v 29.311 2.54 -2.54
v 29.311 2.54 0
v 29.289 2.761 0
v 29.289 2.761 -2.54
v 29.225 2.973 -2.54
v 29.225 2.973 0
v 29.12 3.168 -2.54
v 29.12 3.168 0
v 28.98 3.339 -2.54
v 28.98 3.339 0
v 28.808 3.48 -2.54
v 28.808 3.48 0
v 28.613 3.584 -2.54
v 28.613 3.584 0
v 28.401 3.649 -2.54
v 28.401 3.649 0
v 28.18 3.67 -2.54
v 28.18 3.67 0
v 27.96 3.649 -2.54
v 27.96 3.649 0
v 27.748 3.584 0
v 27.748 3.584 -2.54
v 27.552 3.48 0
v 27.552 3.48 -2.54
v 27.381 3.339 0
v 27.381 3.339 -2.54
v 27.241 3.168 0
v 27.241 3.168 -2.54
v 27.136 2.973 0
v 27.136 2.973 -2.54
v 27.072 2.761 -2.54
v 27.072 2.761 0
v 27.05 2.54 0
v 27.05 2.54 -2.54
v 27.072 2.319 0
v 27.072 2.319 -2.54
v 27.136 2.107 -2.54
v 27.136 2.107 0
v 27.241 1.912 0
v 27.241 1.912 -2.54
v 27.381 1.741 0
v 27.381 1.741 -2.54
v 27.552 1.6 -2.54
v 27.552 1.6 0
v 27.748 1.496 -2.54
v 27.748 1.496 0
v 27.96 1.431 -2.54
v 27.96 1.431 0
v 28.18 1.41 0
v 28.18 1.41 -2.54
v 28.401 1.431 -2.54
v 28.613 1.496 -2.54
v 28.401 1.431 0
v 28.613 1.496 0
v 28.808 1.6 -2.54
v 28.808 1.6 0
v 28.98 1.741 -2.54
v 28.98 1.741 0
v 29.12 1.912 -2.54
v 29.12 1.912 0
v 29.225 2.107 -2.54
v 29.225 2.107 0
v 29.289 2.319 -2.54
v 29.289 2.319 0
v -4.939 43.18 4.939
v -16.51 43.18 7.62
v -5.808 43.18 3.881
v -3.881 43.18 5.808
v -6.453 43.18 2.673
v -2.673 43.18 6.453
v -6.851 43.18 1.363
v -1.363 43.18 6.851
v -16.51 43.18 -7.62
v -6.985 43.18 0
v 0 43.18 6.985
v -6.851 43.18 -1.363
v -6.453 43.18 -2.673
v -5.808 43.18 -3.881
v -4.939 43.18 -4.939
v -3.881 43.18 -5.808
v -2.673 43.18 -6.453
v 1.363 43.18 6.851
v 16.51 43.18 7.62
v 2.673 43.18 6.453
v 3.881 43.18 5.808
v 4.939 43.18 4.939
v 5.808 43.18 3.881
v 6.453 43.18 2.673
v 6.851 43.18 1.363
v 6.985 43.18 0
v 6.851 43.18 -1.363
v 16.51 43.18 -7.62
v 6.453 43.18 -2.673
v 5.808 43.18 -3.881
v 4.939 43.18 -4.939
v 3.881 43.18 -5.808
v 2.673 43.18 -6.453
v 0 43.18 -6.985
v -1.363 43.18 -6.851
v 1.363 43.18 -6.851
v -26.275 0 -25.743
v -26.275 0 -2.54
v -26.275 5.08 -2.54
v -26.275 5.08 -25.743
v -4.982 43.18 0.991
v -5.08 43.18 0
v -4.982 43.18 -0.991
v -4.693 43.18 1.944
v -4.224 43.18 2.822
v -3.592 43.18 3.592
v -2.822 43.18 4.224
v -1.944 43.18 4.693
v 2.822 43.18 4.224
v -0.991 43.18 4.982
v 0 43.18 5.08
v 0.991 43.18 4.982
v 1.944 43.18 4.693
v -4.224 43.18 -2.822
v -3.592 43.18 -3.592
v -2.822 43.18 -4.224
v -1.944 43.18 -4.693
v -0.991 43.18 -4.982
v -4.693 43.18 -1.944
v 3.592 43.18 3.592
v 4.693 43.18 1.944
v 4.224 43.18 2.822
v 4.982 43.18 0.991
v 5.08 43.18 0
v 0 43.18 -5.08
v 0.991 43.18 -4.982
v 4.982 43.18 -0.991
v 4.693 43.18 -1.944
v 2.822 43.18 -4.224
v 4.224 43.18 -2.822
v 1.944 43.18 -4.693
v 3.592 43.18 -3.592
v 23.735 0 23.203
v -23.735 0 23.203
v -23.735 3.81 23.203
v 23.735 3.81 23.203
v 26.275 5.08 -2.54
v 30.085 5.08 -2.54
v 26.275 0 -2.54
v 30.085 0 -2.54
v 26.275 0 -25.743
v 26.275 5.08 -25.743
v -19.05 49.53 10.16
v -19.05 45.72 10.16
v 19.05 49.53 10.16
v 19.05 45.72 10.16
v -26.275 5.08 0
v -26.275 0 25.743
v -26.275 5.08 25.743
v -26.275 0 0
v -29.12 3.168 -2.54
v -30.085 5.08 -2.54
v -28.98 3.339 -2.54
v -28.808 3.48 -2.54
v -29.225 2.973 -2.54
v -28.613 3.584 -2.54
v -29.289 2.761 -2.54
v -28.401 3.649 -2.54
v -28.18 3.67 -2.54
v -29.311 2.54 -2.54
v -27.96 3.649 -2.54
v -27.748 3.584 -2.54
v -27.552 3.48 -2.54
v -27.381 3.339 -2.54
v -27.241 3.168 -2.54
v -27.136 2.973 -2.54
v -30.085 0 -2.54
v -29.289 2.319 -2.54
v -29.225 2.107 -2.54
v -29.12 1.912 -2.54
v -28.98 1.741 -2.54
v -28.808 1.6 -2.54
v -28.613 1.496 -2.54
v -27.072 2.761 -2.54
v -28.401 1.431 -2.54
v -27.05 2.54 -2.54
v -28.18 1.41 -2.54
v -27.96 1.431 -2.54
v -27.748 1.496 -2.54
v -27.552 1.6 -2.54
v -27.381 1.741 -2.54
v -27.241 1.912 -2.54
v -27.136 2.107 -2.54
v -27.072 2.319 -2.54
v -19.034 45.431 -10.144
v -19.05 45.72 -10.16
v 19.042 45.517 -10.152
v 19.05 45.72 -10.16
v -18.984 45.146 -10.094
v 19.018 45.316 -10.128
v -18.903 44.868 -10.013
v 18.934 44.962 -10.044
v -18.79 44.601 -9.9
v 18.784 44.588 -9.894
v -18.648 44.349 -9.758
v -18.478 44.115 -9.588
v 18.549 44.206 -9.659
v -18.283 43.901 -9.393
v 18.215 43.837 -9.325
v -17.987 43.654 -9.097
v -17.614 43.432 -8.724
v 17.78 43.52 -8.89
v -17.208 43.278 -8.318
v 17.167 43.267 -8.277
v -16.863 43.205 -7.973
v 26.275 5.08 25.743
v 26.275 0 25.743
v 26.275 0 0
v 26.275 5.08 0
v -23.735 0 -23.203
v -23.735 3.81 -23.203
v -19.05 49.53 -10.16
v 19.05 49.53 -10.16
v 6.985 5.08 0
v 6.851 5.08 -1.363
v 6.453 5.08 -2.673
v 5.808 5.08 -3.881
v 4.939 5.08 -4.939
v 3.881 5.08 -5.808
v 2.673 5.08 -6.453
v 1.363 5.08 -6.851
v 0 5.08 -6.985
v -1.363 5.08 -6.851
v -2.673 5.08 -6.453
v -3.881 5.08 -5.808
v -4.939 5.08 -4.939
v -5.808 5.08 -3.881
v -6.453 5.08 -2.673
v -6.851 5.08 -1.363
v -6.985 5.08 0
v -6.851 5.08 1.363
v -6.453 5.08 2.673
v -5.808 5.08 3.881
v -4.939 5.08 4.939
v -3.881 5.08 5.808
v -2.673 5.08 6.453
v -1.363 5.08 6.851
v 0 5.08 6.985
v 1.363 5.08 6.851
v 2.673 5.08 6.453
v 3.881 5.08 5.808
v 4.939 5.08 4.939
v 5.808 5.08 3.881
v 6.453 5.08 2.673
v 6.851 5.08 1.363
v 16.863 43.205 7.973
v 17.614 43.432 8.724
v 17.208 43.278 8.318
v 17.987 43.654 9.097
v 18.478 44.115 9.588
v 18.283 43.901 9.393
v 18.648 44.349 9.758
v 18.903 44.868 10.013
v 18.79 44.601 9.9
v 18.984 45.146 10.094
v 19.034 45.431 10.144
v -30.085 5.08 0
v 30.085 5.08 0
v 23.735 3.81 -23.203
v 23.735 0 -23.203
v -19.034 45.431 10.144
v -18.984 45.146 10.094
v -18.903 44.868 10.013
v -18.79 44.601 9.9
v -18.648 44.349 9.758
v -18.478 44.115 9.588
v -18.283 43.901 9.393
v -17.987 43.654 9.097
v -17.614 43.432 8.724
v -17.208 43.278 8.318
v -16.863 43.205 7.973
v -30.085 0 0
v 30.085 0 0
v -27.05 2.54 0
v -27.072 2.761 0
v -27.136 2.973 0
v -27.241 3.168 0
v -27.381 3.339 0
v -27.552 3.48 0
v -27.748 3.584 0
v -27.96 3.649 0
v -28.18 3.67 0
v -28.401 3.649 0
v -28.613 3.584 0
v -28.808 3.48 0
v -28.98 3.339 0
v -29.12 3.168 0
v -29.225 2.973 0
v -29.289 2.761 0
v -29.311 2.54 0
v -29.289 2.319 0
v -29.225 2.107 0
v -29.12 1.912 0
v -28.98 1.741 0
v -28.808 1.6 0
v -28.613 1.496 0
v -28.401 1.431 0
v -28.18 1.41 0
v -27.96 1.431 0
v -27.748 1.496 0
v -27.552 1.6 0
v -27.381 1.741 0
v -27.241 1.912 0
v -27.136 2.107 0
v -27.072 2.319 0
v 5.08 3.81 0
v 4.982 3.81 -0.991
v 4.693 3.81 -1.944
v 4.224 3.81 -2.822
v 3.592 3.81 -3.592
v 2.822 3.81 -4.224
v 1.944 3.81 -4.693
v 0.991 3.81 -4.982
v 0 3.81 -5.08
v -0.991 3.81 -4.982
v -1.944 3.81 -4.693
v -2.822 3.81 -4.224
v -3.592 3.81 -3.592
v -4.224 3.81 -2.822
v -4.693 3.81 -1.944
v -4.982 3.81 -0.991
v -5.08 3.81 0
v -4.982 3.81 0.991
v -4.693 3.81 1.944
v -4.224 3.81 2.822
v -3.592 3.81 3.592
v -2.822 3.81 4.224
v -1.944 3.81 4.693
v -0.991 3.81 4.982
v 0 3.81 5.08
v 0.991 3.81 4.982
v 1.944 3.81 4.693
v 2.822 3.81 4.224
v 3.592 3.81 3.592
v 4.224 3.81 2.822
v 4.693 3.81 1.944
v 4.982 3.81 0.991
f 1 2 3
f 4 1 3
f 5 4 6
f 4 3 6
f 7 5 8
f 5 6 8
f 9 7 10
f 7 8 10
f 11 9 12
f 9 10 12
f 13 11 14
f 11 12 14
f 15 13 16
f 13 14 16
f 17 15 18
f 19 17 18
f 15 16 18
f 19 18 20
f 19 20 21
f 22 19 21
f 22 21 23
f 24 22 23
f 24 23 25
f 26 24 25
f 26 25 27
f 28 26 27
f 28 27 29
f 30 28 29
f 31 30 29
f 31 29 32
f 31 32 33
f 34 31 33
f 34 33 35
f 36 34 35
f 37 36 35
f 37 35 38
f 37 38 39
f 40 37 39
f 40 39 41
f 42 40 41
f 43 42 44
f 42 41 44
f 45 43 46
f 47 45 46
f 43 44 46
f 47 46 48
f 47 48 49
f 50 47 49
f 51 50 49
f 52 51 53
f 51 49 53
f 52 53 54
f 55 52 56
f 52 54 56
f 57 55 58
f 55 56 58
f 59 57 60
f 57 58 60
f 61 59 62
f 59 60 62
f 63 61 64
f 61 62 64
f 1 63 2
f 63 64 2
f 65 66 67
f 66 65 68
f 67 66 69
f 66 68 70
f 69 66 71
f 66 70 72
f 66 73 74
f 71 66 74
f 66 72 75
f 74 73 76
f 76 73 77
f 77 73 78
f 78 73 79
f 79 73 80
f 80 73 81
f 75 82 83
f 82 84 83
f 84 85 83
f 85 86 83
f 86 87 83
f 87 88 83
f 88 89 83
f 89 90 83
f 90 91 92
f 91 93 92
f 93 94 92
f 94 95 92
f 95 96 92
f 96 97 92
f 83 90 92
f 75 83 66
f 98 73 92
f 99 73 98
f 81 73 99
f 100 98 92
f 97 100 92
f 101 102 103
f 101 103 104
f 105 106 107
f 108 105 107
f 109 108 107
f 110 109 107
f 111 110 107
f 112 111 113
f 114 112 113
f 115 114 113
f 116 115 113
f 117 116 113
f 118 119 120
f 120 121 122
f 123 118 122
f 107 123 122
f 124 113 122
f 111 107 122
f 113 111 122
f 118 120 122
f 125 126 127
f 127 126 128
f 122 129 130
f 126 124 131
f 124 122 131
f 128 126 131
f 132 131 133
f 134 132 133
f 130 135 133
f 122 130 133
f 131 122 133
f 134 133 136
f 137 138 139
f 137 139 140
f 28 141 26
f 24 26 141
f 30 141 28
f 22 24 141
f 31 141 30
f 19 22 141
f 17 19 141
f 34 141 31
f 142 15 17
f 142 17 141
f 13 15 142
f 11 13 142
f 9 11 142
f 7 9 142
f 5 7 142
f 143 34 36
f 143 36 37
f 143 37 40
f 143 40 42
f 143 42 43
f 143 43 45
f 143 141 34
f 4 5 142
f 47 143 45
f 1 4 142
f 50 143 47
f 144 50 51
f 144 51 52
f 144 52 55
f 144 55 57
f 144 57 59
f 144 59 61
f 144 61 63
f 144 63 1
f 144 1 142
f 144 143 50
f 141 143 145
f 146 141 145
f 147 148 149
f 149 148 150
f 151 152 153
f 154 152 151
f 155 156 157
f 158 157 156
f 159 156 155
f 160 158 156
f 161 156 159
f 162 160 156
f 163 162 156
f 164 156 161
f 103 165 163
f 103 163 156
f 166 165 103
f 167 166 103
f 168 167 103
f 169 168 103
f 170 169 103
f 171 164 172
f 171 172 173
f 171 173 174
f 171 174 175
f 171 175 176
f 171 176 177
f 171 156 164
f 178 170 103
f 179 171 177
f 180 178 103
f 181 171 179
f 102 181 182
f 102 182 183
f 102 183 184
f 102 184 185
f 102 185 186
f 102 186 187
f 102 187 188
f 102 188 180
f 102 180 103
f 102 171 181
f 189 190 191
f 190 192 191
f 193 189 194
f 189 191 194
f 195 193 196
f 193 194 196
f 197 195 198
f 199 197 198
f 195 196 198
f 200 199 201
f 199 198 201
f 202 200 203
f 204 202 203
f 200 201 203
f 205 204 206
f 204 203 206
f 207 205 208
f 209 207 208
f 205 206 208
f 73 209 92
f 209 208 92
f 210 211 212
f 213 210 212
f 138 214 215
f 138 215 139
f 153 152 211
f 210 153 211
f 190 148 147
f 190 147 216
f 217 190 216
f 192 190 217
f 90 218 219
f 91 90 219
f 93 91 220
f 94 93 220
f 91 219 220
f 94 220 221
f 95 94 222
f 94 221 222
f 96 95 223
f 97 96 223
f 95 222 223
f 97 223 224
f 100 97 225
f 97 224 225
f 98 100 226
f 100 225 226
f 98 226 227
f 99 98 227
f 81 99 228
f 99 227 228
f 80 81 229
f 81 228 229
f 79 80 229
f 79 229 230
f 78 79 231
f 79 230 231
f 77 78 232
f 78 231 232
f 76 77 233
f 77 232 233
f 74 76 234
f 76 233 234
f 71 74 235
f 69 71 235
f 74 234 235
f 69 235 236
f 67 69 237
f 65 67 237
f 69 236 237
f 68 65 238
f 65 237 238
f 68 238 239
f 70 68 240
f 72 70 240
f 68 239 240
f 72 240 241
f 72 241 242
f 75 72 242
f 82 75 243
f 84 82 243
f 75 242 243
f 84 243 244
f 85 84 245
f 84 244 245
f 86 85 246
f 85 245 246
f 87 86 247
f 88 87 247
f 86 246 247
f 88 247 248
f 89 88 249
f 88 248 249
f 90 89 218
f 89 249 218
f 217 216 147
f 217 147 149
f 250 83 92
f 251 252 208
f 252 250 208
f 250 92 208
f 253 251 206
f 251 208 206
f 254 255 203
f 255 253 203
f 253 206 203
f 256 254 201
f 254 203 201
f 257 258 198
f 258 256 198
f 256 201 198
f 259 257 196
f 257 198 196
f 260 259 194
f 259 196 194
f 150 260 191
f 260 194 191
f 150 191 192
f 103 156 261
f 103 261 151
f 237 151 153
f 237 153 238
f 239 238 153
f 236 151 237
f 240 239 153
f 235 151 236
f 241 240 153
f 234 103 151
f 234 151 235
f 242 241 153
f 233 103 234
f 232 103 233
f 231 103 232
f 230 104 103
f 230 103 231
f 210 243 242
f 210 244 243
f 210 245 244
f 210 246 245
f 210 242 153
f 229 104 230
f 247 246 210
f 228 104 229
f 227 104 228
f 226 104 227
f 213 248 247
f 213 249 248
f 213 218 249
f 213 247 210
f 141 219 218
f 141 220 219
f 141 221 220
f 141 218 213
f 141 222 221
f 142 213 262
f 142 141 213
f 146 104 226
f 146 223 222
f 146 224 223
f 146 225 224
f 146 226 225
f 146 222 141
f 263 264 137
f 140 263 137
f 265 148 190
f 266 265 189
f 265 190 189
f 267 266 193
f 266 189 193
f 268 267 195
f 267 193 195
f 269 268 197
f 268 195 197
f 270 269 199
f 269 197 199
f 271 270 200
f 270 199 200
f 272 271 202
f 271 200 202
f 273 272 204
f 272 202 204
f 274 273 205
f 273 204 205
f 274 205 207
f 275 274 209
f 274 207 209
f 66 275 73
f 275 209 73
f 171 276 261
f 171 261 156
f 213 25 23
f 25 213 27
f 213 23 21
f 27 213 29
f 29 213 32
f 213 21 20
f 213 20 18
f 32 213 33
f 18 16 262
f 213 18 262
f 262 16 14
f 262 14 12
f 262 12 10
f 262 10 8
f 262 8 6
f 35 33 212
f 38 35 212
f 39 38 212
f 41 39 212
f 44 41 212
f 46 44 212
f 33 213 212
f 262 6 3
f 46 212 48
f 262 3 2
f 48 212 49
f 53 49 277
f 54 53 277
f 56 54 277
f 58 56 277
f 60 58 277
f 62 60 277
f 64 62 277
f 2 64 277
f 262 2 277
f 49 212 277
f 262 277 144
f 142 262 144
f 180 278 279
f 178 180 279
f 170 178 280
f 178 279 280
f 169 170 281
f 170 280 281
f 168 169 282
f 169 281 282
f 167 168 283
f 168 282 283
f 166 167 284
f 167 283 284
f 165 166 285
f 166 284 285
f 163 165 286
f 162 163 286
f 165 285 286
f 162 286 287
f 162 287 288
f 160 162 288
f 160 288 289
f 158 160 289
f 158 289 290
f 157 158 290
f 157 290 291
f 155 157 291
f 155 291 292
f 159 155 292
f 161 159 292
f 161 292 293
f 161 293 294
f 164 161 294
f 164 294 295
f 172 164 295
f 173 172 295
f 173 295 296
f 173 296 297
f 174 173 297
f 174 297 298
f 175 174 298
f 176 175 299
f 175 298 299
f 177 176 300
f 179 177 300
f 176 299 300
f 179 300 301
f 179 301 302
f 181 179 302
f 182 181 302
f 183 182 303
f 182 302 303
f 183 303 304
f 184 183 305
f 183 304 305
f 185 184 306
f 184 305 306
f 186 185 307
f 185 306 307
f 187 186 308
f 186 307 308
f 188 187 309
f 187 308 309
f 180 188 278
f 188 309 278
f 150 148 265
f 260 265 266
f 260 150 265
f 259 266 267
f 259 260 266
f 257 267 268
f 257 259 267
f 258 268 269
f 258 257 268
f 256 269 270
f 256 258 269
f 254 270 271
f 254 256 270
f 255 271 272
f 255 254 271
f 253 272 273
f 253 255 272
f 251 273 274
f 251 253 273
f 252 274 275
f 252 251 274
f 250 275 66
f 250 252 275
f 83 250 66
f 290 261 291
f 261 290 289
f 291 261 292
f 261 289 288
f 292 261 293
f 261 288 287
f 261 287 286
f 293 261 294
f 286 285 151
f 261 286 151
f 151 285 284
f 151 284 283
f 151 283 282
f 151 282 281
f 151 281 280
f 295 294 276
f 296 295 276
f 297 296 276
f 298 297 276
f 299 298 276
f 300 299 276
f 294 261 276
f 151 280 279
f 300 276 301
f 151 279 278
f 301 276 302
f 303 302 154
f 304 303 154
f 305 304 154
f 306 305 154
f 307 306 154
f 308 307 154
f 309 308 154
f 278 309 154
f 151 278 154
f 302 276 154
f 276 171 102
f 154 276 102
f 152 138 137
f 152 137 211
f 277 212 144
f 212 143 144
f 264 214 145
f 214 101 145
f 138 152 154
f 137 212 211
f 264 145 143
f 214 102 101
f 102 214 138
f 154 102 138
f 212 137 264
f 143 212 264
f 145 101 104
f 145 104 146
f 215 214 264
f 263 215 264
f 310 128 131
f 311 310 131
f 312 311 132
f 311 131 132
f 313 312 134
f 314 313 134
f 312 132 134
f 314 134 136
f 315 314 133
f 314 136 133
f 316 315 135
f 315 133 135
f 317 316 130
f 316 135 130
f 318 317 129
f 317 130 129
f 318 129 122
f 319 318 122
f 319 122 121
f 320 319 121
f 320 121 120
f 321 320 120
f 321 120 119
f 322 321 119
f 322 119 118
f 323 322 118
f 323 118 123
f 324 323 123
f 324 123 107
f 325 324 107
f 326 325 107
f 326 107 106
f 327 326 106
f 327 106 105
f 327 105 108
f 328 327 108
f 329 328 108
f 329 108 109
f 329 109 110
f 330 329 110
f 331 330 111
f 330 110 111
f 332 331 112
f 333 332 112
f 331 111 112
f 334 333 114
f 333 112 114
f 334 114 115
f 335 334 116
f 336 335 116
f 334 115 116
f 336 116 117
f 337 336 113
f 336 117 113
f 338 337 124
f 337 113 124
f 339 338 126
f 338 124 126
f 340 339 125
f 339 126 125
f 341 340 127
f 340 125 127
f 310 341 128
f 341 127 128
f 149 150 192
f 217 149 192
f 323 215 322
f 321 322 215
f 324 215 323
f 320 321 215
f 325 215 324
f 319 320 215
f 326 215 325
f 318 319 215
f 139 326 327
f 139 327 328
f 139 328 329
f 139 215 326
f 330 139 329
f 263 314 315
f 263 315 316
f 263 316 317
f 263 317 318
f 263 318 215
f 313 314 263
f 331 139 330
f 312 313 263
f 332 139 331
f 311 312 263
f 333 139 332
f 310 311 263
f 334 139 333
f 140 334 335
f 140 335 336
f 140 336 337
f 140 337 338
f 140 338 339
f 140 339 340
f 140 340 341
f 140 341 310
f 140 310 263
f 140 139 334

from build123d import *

# Parameters (mm, degrees)
SKETCH2_W           = 52.5507204
SKETCH2_H           = 51.48598542
SKETCH2_W_2         = 3.81
SKETCH2_H_2         = 2.54
BOSS_EXTRUDE1_DEPTH = 5.08
SKETCH3_W           = 47.4707204
SKETCH3_H           = 46.40598542
CUT_EXTRUDE1_DEPTH  = 3.81
SKETCH4_R           = 1.1303
CUT_EXTRUDE2_DEPTH  = 3.302
SKETCH5_R           = 5.08
CUT_EXTRUDE3_DEPTH  = 1.9304
SKETCH6_R           = 6.985
BOSS_EXTRUDE2_DEPTH = 38.1
SKETCH8_R           = 5.08
CUT_EXTRUDE4_DEPTH  = 38.1
SKETCH7_W           = 38.1
SKETCH7_H           = 20.32
BOSS_EXTRUDE3_DEPTH = 6.35
FILLET3_R           = 2.54


with BuildPart() as part:
    # Sketch2 → Boss-Extrude1 (new body)
    with BuildSketch(Plane(origin=(0, 0, 0), x_dir=(1, 0, 0), z_dir=(0, 1, 0))):
        with Locations((0, 3.81e-06)):
            Rectangle(SKETCH2_W, SKETCH2_H)
        with Locations((28.1803602, 1.27)):
            Rectangle(SKETCH2_W_2, SKETCH2_H_2)
        with Locations((-28.1803602, 1.2700127)):
            Rectangle(SKETCH2_W_2, SKETCH2_H_2)
    extrude(amount=BOSS_EXTRUDE1_DEPTH)

    # Sketch3 → Cut-Extrude1 (cut)
    with BuildSketch(Plane.XZ):
        with Locations((0, -3.81e-06)):
            Rectangle(SKETCH3_W, SKETCH3_H)
    extrude(amount=-CUT_EXTRUDE1_DEPTH, mode=Mode.SUBTRACT)

    # Sketch4 → Cut-Extrude2 (cut)
    with BuildSketch(Plane.XY):
        with Locations((28.1803602, 2.54)):
            Circle(SKETCH4_R)
        with Locations((-28.1803602, 2.54)):
            Circle(SKETCH4_R)
    extrude(amount=-CUT_EXTRUDE2_DEPTH, mode=Mode.SUBTRACT)

    # Sketch5 → Cut-Extrude3 (cut)
    with BuildSketch(Plane(origin=(0, 5.08, 0), x_dir=(1, 0, 0), z_dir=(0, 1, 0))):
        Circle(SKETCH5_R)
    extrude(amount=-CUT_EXTRUDE3_DEPTH, mode=Mode.SUBTRACT)

    # Sketch6 → Boss-Extrude2 (add)
    with BuildSketch(Plane(origin=(0, 5.08, 0), x_dir=(1, 0, 0), z_dir=(0, 1, 0))):
        Circle(SKETCH6_R)
    extrude(amount=BOSS_EXTRUDE2_DEPTH)

    # Sketch8 → Cut-Extrude4 (cut)
    with BuildSketch(Plane(origin=(0, 43.18, 0), x_dir=(1, 0, 0), z_dir=(0, 1, 0))):
        Circle(SKETCH8_R)
    extrude(amount=-CUT_EXTRUDE4_DEPTH, mode=Mode.SUBTRACT)

    # Sketch7 → Boss-Extrude3 (add)
    with BuildSketch(Plane(origin=(0, 43.18, 0), x_dir=(1, 0, 0), z_dir=(0, 1, 0))):
        Rectangle(SKETCH7_W, SKETCH7_H)
    extrude(amount=BOSS_EXTRUDE3_DEPTH)

    # Fillet3
    fillet3_edges = [part.edges().sort_by_distance(p)[0] for p in [
        (-19.05, 43.18, 0),
        (0, 43.18, 10.16),
        (19.05, 43.18, 0),
        (0, 43.18, -10.16),
    ]]
    fillet(fillet3_edges, radius=FILLET3_R)


solid = part.part
